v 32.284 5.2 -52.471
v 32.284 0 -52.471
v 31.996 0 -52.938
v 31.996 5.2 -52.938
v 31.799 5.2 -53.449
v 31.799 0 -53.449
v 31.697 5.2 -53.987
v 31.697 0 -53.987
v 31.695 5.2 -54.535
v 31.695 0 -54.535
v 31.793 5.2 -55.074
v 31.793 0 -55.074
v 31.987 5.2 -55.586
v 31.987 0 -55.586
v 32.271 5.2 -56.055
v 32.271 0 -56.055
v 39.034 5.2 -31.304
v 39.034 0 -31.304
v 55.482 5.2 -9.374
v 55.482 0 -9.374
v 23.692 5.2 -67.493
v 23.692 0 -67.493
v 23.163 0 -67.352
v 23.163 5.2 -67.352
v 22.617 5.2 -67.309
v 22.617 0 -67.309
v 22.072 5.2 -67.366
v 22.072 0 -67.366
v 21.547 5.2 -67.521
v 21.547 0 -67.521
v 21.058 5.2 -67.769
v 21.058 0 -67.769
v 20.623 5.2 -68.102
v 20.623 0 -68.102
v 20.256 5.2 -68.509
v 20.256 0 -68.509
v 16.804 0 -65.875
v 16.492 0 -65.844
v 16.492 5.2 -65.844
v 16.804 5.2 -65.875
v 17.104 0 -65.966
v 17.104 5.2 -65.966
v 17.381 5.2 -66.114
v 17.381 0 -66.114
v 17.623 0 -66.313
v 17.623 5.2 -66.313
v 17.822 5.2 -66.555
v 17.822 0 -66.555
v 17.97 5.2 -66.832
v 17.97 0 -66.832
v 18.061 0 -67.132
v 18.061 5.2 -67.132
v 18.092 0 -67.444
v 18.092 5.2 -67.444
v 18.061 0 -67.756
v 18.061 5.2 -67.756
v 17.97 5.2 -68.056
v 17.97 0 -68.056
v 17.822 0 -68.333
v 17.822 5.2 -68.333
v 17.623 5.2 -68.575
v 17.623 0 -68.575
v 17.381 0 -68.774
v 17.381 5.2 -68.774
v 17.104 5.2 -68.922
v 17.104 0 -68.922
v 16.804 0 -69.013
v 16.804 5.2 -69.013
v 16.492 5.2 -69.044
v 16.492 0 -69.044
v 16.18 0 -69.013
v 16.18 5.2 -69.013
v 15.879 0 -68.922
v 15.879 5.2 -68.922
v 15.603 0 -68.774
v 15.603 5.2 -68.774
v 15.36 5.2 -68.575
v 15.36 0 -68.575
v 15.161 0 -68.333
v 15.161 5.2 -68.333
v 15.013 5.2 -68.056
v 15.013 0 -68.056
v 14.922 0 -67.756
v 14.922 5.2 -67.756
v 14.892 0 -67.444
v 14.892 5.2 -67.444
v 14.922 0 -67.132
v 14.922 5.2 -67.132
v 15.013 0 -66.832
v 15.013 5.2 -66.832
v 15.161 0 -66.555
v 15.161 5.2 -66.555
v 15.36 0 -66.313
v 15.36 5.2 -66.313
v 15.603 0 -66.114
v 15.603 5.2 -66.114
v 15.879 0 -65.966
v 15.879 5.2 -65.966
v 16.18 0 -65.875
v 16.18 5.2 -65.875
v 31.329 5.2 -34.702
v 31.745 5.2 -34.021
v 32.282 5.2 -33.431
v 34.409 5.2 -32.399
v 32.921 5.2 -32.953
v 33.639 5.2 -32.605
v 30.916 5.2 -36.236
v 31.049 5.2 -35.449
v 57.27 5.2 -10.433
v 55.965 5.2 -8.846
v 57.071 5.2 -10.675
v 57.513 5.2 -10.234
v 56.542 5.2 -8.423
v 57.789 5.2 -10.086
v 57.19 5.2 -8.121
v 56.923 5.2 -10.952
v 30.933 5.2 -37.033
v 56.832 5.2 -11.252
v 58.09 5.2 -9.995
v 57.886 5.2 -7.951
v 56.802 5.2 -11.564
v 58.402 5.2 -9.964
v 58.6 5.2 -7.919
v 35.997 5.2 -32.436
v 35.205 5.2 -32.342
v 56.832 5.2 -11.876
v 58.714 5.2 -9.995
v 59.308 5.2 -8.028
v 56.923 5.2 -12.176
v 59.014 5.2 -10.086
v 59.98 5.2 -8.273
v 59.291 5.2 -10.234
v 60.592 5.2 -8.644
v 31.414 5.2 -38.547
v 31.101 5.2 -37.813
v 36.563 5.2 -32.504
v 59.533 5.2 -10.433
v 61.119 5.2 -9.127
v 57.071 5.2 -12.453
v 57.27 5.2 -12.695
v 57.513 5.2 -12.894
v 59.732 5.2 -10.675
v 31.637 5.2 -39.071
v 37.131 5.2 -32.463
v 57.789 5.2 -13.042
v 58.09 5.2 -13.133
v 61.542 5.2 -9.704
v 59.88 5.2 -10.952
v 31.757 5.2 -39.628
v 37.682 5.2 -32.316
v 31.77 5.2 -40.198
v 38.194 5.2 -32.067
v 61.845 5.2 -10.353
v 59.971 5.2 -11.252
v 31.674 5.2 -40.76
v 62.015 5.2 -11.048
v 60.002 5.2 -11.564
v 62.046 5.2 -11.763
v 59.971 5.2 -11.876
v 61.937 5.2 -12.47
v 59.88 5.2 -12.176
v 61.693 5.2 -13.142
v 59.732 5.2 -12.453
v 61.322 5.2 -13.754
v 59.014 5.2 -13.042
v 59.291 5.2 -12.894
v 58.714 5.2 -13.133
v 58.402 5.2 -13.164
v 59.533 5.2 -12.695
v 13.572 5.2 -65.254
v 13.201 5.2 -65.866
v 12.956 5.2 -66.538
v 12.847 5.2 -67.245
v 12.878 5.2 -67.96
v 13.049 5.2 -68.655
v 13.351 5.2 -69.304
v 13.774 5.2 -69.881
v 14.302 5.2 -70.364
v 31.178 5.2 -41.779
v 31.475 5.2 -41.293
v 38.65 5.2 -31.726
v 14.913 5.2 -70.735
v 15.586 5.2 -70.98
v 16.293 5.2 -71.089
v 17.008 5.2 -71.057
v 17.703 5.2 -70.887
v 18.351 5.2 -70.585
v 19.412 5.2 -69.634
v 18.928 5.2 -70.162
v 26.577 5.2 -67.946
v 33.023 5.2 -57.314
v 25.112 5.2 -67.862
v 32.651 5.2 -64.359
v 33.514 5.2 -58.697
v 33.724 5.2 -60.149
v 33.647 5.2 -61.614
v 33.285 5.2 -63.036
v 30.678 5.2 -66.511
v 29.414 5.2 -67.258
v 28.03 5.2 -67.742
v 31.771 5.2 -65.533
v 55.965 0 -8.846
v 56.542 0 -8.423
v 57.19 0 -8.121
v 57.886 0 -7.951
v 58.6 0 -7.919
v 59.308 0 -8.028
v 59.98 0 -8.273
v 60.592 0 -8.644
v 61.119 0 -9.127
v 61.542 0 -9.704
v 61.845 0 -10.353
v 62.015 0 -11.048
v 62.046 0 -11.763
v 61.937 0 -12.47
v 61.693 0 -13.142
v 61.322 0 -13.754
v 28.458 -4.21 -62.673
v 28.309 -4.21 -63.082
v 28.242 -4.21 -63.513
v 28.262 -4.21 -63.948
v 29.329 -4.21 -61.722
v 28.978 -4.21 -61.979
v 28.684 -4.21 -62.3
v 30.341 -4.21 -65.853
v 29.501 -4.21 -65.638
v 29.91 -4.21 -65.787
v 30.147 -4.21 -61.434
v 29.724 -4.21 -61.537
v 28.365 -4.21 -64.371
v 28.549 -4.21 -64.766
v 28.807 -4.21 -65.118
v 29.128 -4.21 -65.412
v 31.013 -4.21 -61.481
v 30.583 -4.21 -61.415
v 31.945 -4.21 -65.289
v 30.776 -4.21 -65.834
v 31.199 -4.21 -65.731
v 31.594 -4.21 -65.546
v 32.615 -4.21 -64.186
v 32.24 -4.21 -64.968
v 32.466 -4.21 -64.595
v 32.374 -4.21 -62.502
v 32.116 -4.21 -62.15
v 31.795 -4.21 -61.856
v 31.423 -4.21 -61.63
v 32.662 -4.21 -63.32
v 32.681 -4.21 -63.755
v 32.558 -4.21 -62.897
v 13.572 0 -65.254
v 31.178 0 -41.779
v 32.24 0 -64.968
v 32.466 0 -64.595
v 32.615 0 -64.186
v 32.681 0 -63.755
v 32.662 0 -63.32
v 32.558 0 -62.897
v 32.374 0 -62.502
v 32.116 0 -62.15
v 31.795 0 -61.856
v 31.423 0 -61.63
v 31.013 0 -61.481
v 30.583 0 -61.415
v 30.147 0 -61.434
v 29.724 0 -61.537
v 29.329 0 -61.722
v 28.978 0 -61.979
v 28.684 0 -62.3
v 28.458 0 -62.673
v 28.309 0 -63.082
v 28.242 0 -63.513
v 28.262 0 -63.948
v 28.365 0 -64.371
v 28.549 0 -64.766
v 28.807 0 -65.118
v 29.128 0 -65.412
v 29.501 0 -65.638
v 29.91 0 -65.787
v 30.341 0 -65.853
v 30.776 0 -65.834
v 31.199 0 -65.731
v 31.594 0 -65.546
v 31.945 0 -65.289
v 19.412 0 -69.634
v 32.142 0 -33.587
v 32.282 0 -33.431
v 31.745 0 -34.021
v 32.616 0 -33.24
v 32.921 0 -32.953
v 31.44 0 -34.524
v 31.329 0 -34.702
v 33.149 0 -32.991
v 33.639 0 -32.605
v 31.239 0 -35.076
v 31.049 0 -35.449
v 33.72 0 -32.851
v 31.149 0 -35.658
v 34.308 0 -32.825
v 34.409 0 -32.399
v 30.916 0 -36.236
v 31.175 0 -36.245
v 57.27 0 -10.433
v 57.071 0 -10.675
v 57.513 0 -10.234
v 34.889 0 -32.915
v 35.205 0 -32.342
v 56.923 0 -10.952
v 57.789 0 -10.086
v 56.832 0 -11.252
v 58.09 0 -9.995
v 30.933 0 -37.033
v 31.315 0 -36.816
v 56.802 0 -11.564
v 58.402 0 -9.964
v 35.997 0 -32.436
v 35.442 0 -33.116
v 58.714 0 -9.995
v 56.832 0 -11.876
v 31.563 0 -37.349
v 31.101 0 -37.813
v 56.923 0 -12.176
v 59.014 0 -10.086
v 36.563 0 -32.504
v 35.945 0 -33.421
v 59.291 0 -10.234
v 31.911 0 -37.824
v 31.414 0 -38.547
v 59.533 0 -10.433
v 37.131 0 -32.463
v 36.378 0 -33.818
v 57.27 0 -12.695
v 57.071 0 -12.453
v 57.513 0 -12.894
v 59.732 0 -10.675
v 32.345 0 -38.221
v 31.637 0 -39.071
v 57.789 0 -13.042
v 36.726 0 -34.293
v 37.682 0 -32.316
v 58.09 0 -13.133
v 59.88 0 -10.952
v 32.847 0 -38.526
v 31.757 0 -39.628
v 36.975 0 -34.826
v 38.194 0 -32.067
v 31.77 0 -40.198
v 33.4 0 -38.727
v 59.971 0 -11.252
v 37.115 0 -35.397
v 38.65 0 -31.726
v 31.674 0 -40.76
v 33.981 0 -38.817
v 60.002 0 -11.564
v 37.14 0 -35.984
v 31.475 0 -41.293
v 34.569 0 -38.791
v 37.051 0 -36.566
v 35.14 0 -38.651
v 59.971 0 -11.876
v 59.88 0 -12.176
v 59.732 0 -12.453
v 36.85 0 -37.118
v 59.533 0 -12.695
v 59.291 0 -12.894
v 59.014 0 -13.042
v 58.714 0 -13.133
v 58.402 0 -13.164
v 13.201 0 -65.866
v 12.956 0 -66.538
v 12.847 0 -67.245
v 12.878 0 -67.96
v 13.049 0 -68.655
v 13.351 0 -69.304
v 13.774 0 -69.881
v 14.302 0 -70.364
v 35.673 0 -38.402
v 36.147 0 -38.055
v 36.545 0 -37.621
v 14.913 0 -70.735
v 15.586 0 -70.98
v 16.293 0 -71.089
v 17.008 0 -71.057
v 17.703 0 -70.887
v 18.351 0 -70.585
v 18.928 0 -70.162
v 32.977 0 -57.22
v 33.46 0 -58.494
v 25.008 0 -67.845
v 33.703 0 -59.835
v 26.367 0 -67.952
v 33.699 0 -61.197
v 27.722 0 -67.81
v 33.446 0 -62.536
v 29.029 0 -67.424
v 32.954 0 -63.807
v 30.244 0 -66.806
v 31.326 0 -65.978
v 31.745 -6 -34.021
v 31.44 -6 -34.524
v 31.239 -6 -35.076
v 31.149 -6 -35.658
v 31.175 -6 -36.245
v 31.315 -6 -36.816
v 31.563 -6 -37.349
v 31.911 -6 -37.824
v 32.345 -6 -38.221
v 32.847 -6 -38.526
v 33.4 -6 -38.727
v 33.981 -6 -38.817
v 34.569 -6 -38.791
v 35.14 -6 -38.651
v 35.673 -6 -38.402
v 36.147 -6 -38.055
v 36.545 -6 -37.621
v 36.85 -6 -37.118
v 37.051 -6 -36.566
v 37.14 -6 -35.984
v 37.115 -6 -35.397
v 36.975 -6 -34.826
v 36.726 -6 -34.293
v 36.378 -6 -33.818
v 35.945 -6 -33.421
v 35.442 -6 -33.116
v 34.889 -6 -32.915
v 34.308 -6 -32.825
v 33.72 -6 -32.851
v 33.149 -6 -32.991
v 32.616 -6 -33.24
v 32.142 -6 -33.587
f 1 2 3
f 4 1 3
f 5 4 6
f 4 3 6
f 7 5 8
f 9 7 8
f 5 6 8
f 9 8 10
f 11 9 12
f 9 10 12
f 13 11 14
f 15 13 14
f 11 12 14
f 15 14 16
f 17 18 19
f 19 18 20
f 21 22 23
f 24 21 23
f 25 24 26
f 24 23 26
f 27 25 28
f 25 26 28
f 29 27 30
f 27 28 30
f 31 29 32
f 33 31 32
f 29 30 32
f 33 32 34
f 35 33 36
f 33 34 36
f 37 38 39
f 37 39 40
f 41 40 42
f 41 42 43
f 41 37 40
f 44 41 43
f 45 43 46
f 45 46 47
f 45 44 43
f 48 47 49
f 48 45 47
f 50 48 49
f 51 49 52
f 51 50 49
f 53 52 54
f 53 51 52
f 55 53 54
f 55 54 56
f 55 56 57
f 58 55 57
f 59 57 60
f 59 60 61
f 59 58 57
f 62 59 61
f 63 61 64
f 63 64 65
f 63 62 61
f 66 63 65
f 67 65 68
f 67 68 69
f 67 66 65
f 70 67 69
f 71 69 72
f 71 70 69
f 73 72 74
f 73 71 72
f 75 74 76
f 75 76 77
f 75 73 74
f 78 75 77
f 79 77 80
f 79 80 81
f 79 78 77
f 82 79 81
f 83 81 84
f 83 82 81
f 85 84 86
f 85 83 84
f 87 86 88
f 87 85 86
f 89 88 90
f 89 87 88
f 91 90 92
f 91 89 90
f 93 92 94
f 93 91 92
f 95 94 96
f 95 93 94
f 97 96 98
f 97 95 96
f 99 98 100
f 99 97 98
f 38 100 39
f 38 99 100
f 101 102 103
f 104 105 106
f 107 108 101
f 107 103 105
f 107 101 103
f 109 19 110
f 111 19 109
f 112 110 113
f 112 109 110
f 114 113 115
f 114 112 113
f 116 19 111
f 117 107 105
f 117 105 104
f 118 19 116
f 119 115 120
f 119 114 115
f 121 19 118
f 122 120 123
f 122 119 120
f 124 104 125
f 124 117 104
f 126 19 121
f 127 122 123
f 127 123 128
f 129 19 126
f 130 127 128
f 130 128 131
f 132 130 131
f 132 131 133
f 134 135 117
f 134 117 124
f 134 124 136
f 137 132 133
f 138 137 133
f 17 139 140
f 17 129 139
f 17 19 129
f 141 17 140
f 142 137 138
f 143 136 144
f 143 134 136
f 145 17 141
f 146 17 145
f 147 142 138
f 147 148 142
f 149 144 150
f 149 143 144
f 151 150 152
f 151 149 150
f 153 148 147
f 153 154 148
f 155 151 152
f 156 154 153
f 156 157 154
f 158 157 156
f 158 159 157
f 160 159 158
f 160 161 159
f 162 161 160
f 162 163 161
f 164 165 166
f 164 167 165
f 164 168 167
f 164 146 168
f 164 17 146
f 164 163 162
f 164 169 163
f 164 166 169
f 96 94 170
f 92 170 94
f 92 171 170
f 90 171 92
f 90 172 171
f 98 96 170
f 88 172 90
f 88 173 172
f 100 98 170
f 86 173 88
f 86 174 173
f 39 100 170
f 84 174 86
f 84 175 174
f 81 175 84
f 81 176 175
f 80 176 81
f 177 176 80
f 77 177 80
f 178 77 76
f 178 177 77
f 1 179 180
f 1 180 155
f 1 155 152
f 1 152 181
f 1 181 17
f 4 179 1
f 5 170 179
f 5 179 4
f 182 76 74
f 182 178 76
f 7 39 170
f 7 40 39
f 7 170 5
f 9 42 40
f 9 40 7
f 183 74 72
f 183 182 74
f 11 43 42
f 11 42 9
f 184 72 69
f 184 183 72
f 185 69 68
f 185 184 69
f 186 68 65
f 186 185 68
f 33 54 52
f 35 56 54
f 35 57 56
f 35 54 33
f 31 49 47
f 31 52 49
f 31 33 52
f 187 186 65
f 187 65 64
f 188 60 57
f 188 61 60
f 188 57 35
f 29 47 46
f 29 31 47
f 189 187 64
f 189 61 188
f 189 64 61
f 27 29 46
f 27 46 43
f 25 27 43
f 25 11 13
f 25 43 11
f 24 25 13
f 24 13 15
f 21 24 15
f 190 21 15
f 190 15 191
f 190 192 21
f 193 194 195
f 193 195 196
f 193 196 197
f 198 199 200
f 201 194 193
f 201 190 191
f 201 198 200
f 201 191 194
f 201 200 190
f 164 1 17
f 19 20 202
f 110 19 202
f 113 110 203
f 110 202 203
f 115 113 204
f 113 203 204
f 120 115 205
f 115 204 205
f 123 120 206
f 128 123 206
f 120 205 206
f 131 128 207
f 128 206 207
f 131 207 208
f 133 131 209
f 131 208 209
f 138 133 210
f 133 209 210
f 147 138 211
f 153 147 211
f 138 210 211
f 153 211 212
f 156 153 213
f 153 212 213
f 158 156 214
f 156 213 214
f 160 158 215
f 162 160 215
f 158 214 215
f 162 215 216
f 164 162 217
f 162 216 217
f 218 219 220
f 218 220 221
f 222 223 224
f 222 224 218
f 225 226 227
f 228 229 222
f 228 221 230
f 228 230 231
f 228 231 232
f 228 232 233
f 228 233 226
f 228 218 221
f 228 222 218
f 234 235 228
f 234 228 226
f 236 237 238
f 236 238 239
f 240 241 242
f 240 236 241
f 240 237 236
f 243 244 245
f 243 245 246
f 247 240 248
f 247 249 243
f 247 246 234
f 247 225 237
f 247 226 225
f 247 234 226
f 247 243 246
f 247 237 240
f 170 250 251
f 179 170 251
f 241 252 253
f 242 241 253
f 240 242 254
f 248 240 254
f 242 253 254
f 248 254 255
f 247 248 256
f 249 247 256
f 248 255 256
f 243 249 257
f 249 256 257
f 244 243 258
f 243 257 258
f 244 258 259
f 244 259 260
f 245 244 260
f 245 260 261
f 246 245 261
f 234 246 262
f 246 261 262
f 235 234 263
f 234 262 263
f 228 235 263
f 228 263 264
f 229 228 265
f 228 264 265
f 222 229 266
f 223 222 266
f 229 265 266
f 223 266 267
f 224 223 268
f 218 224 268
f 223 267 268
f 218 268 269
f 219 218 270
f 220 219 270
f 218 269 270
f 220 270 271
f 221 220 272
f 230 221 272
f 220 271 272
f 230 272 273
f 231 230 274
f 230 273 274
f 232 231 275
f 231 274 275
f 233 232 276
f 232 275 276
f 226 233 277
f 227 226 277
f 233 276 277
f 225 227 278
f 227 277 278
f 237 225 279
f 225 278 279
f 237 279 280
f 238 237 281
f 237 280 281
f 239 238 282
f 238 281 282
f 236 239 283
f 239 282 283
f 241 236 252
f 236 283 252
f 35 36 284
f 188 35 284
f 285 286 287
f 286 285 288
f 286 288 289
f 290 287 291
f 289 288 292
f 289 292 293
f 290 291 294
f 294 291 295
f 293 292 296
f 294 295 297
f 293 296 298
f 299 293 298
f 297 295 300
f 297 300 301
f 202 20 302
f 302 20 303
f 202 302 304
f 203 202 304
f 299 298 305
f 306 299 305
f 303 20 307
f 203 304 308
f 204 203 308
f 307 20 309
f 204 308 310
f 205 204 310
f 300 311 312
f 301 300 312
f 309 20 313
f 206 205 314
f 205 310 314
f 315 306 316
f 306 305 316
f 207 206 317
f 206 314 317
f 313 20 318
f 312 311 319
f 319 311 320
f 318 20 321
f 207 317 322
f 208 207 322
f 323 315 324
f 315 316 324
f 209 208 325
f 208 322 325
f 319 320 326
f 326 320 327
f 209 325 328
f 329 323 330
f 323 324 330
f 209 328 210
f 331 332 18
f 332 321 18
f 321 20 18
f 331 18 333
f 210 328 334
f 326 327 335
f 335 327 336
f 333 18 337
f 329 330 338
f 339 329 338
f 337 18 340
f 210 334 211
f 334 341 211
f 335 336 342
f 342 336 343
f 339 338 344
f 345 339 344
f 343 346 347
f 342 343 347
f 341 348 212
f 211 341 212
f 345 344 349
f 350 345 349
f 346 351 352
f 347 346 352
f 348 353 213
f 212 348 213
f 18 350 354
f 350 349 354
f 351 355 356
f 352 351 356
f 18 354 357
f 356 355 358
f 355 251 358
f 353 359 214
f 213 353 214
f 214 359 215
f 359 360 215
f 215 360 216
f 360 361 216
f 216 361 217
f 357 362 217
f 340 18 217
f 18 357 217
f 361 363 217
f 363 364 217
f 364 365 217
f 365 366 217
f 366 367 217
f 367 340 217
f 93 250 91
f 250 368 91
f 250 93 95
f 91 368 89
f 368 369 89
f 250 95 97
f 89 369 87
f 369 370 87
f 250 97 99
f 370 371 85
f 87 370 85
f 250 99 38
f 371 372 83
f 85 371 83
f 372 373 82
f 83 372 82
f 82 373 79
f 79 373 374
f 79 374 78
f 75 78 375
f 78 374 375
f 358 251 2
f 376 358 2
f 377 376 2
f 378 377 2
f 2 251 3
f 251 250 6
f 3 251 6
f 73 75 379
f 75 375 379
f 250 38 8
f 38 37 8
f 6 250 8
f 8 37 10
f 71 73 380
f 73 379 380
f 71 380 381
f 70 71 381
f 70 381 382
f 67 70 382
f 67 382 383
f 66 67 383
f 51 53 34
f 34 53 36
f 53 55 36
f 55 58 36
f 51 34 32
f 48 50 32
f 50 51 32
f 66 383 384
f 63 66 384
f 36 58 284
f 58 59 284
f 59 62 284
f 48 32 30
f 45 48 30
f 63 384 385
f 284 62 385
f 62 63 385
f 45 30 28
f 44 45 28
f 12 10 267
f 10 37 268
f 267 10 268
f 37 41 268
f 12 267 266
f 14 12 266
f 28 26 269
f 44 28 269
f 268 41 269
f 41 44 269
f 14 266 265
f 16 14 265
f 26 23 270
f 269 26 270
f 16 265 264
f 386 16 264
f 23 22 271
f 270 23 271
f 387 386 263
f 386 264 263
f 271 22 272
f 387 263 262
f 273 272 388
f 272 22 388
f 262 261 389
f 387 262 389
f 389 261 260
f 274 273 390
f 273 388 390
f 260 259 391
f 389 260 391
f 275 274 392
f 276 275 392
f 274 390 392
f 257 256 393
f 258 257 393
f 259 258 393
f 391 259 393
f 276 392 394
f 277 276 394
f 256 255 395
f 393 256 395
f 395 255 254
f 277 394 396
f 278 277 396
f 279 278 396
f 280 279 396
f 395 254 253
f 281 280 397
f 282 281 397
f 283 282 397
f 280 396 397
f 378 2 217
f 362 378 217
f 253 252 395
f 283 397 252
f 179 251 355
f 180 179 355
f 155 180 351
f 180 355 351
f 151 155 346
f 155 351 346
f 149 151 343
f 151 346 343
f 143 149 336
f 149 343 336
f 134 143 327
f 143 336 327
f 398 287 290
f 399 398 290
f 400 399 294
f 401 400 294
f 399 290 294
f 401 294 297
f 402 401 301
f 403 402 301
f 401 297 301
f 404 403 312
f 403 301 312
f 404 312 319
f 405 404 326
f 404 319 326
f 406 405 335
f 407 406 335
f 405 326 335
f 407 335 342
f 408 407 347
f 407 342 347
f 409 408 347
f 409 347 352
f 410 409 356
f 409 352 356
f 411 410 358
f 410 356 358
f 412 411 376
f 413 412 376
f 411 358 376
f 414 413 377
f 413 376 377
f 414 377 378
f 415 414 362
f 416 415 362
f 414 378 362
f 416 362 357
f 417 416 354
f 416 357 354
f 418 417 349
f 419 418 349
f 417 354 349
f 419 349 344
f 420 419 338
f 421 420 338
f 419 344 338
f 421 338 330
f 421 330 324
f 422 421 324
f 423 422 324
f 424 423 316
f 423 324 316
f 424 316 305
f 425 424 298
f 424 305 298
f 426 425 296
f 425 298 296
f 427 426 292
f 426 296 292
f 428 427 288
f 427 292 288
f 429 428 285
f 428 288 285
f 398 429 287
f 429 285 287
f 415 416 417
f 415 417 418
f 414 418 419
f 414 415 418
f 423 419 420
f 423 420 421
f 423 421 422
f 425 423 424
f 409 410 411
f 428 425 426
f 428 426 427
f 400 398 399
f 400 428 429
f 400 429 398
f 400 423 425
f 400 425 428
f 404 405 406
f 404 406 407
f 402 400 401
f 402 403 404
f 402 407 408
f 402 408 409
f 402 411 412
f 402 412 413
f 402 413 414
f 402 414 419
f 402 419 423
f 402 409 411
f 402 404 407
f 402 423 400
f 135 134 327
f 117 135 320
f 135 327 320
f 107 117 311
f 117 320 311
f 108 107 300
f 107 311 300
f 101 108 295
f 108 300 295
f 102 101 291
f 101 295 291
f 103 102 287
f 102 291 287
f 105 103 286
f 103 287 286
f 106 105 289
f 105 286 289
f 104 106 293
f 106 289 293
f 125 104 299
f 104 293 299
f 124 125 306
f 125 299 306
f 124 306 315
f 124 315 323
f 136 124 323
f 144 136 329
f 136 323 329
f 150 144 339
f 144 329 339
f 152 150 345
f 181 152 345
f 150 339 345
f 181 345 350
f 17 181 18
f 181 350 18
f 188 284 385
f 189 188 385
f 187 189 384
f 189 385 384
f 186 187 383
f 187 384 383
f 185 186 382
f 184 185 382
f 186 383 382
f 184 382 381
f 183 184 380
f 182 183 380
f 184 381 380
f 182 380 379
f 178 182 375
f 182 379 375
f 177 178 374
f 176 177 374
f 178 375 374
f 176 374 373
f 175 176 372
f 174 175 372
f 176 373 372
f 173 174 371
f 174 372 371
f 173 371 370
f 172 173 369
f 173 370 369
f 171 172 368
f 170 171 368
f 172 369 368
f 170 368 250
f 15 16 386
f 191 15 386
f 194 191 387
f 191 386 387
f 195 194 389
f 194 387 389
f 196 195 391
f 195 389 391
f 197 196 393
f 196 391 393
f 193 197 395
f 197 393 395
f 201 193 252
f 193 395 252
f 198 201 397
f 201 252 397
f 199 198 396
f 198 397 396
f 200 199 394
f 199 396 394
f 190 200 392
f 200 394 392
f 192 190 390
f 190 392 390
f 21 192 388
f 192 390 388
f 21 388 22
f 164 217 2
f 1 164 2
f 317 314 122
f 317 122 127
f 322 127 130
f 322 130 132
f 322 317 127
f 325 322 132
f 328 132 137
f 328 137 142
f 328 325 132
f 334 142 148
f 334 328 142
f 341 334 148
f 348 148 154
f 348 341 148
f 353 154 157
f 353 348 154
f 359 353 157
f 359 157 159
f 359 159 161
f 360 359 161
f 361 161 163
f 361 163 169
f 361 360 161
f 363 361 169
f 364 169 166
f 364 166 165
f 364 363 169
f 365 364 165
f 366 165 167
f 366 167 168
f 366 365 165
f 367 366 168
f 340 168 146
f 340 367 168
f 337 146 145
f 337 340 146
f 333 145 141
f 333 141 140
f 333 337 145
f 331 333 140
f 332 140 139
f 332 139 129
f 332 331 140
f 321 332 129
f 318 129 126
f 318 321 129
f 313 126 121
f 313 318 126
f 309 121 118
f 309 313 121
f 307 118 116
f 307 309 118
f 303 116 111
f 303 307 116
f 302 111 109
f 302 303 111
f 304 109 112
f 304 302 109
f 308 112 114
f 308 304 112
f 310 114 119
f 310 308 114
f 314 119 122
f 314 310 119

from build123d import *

# Parameters (mm, degrees)
SKETCH1_R           = 1.6
BOSS_EXTRUDE1_DEPTH = 5.2
SKETCH2_R           = 3
BOSS_EXTRUDE2_DEPTH = 6
SKETCH3_R           = 2.2225
BOSS_EXTRUDE3_DEPTH = 4.21


with BuildPart() as part:
    # Sketch1 → Boss-Extrude1 (new body)
    with BuildSketch(Plane(origin=(0, 0, 0), x_dir=(1, 0, 0), z_dir=(0, 1, 0))):
        with BuildLine():
            Line((13.571690234, 65.253997386), (31.177749859, 41.779251219))
            ThreePointArc((31.177749859, 41.779251219), (31.769771696, 40.197895519), (31.413929092, 38.547273896))
            ThreePointArc((31.413929092, 38.547273896), (31.744690234, 34.020997386), (35.997302563, 32.436109267))
            ThreePointArc((35.997302563, 32.436109267), (37.681535251, 32.315544113), (39.033870608, 31.304423554))
            Line((39.033870608, 31.304423554), (55.481690234, 9.373997386))
            ThreePointArc((55.481690234, 9.373997386), (60.591690234, 8.643997386), (61.321690234, 13.753997386))
            Line((61.321690234, 13.753997386), (32.283591318, 52.471462608))
            ThreePointArc((32.283591318, 52.471462608), (31.683609832, 54.260923069), (32.271003193, 56.054555017))
            ThreePointArc((32.271003193, 56.054555017), (32.239690234, 64.967497386), (23.692033188, 67.493181691))
            ThreePointArc((23.692033188, 67.493181691), (21.805676377, 67.431501009), (20.25578915, 68.508532165))
            Line((20.25578915, 68.508532165), (19.411690234, 69.633997386))
            ThreePointArc((19.411690234, 69.633997386), (14.301690234, 70.363997386), (13.571690234, 65.253997386))
        make_face()
        with Locations(Location((16.491690234, 67.443997386, 0), (0, 0, 270))):
            Circle(SKETCH1_R, mode=Mode.SUBTRACT)
        with Locations(Location((58.401690234, 11.563997386, 0), (0, 0, 270))):
            Circle(SKETCH1_R, mode=Mode.SUBTRACT)
    extrude(amount=BOSS_EXTRUDE1_DEPTH)

    # Sketch2 → Boss-Extrude2 (add)
    with BuildSketch(Plane.XZ):
        with Locations(Location((34.144690234, -35.820997386, 0), (0, 0, 143.129227332))):
            Circle(SKETCH2_R)
    extrude(amount=BOSS_EXTRUDE2_DEPTH)

    # Sketch3 → Boss-Extrude3 (add)
    with BuildSketch(Plane.XZ):
        with Locations(Location((30.461690234, -63.633997386, 0), (0, 0, 323.129453592))):
            Circle(SKETCH3_R)
    extrude(amount=BOSS_EXTRUDE3_DEPTH)


solid = part.part
